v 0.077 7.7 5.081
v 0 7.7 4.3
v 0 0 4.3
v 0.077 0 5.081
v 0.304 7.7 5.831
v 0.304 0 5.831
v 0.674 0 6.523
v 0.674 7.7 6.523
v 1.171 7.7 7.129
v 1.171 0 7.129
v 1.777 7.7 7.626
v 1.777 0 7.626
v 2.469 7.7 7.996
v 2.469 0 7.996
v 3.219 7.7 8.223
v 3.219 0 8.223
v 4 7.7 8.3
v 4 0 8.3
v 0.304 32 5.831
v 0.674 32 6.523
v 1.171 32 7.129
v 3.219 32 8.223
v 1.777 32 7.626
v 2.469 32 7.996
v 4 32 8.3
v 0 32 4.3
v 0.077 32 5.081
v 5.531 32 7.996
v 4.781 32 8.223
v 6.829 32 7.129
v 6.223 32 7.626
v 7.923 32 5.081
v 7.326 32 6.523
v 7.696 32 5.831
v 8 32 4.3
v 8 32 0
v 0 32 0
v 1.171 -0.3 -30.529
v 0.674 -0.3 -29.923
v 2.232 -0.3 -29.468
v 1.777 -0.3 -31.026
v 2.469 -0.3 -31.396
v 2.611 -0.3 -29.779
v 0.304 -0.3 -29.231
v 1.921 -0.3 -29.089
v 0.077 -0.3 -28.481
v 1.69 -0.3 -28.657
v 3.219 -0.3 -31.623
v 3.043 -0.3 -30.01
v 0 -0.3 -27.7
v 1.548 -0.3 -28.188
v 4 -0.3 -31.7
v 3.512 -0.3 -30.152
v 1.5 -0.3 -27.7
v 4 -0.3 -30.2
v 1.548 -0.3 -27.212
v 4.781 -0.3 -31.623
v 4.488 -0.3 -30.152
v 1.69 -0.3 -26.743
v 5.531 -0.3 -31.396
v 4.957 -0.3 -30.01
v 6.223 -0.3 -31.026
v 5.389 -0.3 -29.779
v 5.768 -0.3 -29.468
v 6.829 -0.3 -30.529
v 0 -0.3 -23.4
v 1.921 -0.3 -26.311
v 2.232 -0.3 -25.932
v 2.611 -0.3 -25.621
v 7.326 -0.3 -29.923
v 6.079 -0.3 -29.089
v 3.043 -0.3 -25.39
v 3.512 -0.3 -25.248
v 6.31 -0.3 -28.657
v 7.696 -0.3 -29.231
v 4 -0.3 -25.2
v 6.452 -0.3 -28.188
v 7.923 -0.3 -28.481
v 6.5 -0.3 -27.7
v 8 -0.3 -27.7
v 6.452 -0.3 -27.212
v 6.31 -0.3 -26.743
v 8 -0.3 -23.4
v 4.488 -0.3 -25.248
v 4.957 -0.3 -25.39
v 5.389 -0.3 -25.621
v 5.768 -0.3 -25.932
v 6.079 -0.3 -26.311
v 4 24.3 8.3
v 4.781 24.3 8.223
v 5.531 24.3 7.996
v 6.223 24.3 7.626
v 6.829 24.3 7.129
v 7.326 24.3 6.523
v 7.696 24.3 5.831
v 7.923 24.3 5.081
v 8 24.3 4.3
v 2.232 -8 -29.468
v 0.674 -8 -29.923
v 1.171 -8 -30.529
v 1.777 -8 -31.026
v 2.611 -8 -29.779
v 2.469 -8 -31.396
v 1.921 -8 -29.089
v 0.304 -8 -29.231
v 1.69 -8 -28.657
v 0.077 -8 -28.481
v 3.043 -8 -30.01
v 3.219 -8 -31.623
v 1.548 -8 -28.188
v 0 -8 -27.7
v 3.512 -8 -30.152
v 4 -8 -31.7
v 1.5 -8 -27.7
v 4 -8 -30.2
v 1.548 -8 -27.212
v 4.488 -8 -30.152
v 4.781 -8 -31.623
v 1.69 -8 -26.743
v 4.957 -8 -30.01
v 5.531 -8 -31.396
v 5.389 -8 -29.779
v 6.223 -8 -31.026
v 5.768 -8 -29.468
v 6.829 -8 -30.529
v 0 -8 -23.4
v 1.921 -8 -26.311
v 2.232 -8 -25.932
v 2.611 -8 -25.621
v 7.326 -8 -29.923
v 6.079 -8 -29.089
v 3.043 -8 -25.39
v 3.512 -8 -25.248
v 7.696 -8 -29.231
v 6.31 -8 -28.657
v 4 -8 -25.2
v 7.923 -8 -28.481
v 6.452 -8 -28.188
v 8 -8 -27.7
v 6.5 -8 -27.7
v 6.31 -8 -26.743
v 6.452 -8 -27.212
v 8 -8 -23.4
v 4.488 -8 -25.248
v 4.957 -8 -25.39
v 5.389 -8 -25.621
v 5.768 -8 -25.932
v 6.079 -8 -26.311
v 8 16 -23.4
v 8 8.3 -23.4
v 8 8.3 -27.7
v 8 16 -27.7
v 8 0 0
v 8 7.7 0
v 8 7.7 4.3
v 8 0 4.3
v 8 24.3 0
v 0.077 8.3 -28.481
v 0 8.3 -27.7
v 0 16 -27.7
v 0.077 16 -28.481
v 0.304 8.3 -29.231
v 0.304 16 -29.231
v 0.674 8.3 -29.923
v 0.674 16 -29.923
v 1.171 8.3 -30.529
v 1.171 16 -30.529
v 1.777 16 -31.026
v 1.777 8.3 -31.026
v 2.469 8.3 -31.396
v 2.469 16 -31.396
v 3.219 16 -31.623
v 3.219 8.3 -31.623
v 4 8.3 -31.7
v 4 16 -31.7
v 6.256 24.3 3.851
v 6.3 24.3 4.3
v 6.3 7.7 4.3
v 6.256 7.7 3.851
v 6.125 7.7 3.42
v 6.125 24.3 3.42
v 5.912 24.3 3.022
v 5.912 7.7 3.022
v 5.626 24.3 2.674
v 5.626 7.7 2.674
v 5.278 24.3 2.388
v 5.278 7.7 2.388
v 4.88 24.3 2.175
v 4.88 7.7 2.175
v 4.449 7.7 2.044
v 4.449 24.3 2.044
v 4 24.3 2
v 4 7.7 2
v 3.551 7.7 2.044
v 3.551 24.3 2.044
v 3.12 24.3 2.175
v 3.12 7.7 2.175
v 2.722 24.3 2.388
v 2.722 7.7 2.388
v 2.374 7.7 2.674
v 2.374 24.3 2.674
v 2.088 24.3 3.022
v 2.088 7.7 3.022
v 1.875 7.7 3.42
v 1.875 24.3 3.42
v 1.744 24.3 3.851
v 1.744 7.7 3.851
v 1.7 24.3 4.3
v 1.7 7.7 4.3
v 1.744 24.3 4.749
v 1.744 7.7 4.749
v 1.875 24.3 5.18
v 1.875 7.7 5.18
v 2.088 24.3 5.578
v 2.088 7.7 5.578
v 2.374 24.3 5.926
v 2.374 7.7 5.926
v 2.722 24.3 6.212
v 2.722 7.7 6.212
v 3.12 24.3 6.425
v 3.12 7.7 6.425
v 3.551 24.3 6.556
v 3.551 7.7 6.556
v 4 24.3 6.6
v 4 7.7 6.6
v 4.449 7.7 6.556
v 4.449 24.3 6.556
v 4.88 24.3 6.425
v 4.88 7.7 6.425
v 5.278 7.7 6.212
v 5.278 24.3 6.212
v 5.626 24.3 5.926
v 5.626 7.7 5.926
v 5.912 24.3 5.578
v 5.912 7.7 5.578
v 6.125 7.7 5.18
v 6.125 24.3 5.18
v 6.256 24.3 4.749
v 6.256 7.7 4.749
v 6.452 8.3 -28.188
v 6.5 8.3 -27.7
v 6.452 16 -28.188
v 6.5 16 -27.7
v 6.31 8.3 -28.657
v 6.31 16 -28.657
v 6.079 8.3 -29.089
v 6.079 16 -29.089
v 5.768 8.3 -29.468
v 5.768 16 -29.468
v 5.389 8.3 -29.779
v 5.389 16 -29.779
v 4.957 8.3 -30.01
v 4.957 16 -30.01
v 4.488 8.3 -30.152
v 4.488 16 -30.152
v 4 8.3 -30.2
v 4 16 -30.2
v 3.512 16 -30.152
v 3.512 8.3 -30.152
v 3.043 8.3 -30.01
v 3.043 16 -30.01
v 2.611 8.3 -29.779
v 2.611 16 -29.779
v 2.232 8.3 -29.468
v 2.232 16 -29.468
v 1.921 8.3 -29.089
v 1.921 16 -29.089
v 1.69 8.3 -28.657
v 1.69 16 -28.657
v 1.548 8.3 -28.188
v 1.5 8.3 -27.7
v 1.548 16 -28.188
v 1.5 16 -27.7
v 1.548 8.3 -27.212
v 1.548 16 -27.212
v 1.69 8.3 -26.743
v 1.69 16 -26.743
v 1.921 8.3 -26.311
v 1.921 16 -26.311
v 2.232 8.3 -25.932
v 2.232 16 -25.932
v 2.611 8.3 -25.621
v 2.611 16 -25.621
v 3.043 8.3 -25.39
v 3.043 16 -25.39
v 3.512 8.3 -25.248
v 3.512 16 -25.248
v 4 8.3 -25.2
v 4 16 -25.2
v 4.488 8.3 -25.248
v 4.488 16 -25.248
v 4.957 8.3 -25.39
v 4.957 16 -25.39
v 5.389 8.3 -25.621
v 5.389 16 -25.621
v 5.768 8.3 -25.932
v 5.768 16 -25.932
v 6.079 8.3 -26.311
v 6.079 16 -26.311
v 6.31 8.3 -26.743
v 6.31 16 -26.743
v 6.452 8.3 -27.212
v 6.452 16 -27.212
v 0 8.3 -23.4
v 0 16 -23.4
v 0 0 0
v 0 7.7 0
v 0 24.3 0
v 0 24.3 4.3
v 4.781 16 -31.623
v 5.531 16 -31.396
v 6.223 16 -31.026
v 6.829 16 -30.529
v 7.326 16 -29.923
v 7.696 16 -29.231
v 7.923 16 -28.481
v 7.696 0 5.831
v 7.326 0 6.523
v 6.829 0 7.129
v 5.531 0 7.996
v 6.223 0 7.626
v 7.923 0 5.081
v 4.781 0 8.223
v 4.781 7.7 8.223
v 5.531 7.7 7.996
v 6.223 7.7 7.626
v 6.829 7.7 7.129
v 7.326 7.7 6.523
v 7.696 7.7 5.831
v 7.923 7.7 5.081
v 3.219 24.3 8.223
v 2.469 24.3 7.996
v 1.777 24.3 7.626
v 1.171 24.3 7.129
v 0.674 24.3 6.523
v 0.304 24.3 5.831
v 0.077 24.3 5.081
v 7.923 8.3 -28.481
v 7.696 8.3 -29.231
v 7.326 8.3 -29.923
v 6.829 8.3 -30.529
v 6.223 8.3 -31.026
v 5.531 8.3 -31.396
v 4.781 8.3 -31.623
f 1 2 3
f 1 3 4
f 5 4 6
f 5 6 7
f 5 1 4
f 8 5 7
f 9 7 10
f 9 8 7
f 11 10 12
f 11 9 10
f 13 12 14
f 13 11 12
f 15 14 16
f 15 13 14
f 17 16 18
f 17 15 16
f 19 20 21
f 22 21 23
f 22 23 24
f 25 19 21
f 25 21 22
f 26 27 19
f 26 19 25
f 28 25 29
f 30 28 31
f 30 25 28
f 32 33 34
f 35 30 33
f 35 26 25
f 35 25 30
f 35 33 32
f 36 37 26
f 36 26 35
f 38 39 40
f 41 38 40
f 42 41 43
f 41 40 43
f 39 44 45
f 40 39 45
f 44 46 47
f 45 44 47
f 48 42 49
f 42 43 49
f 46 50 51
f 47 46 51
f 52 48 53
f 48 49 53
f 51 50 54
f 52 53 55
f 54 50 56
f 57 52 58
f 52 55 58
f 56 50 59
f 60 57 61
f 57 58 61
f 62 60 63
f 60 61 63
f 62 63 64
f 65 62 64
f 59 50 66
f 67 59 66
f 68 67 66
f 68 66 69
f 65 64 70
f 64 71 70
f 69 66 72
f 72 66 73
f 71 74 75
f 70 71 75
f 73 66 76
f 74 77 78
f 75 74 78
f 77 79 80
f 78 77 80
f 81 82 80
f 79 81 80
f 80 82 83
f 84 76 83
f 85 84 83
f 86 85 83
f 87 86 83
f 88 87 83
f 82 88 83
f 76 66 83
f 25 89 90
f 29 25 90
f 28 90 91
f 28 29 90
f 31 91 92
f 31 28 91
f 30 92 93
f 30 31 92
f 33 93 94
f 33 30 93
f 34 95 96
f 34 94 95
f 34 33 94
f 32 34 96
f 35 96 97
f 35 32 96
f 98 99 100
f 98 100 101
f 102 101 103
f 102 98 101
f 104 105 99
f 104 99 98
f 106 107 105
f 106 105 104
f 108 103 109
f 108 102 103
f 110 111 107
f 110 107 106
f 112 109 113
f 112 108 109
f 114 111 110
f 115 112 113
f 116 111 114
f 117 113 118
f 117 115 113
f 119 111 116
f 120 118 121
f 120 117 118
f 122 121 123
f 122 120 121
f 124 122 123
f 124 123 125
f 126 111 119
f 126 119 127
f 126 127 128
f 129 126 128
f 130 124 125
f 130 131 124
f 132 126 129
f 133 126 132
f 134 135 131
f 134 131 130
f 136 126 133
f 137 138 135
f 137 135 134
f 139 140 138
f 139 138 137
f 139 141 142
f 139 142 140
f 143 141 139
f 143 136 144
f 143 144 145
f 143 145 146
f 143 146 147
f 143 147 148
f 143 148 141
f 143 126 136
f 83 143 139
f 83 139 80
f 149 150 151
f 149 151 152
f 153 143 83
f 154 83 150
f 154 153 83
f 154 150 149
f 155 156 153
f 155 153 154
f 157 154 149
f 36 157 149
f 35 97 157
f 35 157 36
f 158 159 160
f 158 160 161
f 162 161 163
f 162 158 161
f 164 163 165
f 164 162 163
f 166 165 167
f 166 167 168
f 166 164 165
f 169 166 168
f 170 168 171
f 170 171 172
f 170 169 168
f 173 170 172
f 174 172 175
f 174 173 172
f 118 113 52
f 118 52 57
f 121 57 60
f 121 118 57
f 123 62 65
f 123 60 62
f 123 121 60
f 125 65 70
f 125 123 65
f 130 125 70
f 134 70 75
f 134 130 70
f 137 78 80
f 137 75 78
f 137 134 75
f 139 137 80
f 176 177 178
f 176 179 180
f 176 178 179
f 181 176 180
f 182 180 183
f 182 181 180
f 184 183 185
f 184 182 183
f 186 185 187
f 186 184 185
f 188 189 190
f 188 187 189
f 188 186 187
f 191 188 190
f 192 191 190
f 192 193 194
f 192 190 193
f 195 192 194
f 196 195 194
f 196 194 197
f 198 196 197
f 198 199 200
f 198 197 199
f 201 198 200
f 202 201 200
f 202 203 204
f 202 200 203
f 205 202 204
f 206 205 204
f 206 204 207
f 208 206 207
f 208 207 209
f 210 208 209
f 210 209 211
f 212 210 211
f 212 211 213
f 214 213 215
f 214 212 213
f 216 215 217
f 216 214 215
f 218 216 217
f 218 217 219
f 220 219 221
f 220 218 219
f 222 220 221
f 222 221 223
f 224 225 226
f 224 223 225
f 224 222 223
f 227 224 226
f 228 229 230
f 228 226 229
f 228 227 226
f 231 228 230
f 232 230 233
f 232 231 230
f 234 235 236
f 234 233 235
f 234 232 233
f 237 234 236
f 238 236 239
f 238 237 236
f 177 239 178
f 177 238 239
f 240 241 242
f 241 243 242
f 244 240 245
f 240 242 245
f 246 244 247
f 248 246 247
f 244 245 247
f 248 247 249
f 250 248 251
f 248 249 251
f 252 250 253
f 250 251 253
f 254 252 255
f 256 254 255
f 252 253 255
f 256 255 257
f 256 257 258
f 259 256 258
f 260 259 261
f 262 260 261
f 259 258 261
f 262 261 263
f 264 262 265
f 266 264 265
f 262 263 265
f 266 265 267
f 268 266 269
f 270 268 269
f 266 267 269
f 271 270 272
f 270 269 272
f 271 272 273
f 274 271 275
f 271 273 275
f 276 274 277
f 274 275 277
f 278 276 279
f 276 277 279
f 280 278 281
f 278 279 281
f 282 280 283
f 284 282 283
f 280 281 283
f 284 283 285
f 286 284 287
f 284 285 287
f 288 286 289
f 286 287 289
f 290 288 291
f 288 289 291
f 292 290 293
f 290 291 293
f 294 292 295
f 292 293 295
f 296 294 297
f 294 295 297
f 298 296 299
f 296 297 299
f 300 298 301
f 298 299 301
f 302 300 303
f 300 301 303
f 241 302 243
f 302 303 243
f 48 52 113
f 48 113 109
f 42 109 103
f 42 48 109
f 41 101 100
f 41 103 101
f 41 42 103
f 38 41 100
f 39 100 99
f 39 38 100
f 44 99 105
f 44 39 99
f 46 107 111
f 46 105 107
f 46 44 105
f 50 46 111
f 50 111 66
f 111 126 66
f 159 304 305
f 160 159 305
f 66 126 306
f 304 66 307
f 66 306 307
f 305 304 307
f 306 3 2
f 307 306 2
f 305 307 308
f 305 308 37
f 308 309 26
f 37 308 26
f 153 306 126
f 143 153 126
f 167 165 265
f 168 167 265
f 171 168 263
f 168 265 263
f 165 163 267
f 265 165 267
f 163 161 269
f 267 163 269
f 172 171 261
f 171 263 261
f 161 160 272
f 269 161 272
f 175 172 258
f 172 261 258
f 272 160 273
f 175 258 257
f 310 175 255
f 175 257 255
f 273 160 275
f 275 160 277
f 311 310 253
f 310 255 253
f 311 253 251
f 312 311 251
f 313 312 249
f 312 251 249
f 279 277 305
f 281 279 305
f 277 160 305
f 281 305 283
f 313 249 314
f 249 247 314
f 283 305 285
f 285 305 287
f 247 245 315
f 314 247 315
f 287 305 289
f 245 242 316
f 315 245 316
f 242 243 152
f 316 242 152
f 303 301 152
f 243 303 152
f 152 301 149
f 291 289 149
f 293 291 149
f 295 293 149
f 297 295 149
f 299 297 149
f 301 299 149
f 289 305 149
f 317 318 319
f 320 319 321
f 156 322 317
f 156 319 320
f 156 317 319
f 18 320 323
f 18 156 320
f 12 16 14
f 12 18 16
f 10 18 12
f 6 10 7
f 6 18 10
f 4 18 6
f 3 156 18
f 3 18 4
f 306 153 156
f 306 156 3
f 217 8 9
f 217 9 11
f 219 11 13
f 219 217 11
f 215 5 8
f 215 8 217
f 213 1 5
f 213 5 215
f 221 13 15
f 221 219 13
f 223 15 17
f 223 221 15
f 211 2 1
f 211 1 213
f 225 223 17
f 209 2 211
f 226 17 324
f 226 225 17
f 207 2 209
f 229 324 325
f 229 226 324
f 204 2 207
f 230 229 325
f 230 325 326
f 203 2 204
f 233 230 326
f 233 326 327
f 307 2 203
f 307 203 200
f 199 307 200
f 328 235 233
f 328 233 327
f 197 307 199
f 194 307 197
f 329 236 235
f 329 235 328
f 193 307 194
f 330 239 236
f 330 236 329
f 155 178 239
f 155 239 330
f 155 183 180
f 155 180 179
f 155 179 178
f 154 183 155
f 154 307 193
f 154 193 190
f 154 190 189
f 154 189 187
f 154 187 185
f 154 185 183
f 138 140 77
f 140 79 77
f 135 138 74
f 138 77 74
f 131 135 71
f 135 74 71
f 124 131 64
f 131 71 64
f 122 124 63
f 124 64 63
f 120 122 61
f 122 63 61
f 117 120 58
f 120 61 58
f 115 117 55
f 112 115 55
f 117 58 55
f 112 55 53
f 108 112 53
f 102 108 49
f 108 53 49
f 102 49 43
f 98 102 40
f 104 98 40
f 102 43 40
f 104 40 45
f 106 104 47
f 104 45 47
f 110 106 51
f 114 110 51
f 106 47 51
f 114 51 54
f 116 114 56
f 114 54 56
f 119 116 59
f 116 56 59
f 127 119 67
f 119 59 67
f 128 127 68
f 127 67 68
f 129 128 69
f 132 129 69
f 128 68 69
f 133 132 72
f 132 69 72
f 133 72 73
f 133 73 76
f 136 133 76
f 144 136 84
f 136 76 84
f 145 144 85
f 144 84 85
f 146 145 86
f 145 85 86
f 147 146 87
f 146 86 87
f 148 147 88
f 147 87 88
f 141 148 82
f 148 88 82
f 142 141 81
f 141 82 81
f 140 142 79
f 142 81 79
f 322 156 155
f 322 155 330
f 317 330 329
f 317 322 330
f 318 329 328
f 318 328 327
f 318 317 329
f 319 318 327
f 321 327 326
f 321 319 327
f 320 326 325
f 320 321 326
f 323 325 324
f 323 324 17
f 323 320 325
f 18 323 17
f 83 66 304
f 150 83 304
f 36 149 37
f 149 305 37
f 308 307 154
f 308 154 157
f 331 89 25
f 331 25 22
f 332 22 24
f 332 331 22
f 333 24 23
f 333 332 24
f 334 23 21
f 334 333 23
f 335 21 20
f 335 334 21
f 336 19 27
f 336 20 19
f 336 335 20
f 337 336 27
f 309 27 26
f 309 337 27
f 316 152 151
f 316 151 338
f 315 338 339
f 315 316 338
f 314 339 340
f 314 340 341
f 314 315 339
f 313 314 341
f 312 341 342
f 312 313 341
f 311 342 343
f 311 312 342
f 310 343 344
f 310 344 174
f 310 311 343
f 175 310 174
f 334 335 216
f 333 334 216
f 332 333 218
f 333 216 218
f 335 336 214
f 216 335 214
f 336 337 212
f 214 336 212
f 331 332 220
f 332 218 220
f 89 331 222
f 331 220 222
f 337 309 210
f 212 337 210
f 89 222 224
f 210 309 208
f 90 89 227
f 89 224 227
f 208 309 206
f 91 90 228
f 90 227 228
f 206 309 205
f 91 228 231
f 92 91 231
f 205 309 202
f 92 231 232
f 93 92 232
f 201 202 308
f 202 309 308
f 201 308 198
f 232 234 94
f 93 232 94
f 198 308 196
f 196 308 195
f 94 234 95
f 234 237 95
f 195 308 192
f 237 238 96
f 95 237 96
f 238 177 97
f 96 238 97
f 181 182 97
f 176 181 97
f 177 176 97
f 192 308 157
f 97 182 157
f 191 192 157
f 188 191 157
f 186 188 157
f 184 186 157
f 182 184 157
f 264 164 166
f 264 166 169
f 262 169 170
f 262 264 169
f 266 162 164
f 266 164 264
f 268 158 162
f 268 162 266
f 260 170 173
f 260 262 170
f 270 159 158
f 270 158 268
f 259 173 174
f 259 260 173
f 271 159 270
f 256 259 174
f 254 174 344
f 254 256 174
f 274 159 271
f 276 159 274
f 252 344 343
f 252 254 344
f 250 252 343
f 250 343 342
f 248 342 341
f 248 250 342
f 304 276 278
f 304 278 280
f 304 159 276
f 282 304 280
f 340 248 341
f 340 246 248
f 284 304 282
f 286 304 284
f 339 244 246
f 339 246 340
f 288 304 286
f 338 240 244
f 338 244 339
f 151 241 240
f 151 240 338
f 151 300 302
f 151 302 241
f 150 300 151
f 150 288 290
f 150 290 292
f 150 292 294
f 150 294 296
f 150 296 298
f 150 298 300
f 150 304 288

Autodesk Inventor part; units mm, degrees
ref_plane "YZ Plane" through (0, 0, 0) normal (1, 0, 0) x (0, 1, 0)
ref_plane "XZ Plane" through (0, 0, 0) normal (0, 1, 0) x (-1, 0, 0)
ref_plane "XY Plane" through (0, 0, 0) normal (0, 0, 1) x (1, 0, 0)
sketch "Sketch2" plane through (0, 0, 0) normal (1, 0, 0) x (0, 1, 0)
  line L0 (0, 0) -> (32, 0)
  line L1 (0, 0) -> (-8, -23.4)
  line L2 (-8, -23.4) -> (16, -23.4)
  line L3 (16, -23.4) -> (32, 0)
  dimension "d4" = 32
  dimension "d32" = 24
  dimension "d34" = 8
  dimension "d35" = 23.4
extrude "Extrusion1" add sketch "Sketch2" along normal blind 8
sketch "Sketch7" plane through (0, -8, -23.4) normal (0, 0, -1) x (-1, 0, 0)
  line L0 (0, 24) -> (-8, 24) projected
  line L1 (-8, 24) -> (0, 24)
  line L2 (0, 24) -> (0, 16.3)
  line L3 (0, 16.3) -> (-8, 16.3)
  line L4 (-8, 16.3) -> (-8, 24)
  line L5 (0, 0) -> (-8, 0) projected
  line L6 (-8, 0) -> (0, 0)
  line L7 (0, 0) -> (0, 7.7)
  line L8 (0, 7.7) -> (-8, 7.7)
  line L9 (-8, 7.7) -> (-8, 0)
  point P0 (0, 8)
  dimension "d36" = 8
  dimension "d37" = 7.7
  dimension "d38" = 8
  dimension "d39" = 7.7
extrude "Extrusion6" add sketch "Sketch7" along normal blind 8.3
sketch "Sketch8" plane through (0, 0, 0) normal (0, 0, 1) x (1, 0, 0)
  line L0 (0, 32) -> (8, 32) projected
  line L1 (8, 32) -> (0, 32)
  line L2 (0, 32) -> (0, 24.3)
  line L3 (0, 24.3) -> (8, 24.3)
  line L4 (8, 24.3) -> (8, 32)
  line L5 (8, 0) -> (0, 0)
  line L6 (0, 0) -> (0, 7.7)
  line L7 (0, 7.7) -> (8, 7.7)
  line L8 (8, 7.7) -> (8, 0)
  dimension "d42" = 8
  dimension "d43" = 7.7
  dimension "d44" = 8
  dimension "d45" = 7.7
extrude "Extrusion7" add sketch "Sketch8" along normal blind 8.3
sketch "Sketch9" plane through (0, 24.3, 0) normal (0, -1, 0) x (1, 0, 0)
  circle A0 centre (4, 4.3) radius 2.3
  line L0 (0, 0) -> (0, 8.3) projected
  line L1 (0, 8.3) -> (8, 8.3) projected
  dimension "d48" = 4.6
  dimension "d49" = 4
  dimension "d50" = 4
extrude "Extrusion8" add sketch "Sketch9" along normal up to surface (16.6 mm away)
sketch "Sketch10" plane through (0, 16, -23.4) normal (0, 1, 0) x (1, 0, 0)
  circle A0 centre (4, 4.3) radius 2.5
  line L0 (8, 0) -> (8, 8.3) projected
  line L1 (0, 8.3) -> (8, 8.3) projected
  point P0 (0, -23.4)
  dimension "d53" = 5
  dimension "d54" = 4
  dimension "d55" = 4
extrude "Extrusion9" cut sketch "Sketch10" against normal up to surface (24 mm away)
fillet "Fillet2" radius 4 8 edges at (0, 12.15, -31.7) (8, 12.15, -31.7) (8, -4.15, -31.7) (0, -4.15, -31.7) (0, 28.15, 8.3) (0, 3.85, 8.3) (8, 28.15, 8.3) (8, 3.85, 8.3)
properties part number "Crank1"
